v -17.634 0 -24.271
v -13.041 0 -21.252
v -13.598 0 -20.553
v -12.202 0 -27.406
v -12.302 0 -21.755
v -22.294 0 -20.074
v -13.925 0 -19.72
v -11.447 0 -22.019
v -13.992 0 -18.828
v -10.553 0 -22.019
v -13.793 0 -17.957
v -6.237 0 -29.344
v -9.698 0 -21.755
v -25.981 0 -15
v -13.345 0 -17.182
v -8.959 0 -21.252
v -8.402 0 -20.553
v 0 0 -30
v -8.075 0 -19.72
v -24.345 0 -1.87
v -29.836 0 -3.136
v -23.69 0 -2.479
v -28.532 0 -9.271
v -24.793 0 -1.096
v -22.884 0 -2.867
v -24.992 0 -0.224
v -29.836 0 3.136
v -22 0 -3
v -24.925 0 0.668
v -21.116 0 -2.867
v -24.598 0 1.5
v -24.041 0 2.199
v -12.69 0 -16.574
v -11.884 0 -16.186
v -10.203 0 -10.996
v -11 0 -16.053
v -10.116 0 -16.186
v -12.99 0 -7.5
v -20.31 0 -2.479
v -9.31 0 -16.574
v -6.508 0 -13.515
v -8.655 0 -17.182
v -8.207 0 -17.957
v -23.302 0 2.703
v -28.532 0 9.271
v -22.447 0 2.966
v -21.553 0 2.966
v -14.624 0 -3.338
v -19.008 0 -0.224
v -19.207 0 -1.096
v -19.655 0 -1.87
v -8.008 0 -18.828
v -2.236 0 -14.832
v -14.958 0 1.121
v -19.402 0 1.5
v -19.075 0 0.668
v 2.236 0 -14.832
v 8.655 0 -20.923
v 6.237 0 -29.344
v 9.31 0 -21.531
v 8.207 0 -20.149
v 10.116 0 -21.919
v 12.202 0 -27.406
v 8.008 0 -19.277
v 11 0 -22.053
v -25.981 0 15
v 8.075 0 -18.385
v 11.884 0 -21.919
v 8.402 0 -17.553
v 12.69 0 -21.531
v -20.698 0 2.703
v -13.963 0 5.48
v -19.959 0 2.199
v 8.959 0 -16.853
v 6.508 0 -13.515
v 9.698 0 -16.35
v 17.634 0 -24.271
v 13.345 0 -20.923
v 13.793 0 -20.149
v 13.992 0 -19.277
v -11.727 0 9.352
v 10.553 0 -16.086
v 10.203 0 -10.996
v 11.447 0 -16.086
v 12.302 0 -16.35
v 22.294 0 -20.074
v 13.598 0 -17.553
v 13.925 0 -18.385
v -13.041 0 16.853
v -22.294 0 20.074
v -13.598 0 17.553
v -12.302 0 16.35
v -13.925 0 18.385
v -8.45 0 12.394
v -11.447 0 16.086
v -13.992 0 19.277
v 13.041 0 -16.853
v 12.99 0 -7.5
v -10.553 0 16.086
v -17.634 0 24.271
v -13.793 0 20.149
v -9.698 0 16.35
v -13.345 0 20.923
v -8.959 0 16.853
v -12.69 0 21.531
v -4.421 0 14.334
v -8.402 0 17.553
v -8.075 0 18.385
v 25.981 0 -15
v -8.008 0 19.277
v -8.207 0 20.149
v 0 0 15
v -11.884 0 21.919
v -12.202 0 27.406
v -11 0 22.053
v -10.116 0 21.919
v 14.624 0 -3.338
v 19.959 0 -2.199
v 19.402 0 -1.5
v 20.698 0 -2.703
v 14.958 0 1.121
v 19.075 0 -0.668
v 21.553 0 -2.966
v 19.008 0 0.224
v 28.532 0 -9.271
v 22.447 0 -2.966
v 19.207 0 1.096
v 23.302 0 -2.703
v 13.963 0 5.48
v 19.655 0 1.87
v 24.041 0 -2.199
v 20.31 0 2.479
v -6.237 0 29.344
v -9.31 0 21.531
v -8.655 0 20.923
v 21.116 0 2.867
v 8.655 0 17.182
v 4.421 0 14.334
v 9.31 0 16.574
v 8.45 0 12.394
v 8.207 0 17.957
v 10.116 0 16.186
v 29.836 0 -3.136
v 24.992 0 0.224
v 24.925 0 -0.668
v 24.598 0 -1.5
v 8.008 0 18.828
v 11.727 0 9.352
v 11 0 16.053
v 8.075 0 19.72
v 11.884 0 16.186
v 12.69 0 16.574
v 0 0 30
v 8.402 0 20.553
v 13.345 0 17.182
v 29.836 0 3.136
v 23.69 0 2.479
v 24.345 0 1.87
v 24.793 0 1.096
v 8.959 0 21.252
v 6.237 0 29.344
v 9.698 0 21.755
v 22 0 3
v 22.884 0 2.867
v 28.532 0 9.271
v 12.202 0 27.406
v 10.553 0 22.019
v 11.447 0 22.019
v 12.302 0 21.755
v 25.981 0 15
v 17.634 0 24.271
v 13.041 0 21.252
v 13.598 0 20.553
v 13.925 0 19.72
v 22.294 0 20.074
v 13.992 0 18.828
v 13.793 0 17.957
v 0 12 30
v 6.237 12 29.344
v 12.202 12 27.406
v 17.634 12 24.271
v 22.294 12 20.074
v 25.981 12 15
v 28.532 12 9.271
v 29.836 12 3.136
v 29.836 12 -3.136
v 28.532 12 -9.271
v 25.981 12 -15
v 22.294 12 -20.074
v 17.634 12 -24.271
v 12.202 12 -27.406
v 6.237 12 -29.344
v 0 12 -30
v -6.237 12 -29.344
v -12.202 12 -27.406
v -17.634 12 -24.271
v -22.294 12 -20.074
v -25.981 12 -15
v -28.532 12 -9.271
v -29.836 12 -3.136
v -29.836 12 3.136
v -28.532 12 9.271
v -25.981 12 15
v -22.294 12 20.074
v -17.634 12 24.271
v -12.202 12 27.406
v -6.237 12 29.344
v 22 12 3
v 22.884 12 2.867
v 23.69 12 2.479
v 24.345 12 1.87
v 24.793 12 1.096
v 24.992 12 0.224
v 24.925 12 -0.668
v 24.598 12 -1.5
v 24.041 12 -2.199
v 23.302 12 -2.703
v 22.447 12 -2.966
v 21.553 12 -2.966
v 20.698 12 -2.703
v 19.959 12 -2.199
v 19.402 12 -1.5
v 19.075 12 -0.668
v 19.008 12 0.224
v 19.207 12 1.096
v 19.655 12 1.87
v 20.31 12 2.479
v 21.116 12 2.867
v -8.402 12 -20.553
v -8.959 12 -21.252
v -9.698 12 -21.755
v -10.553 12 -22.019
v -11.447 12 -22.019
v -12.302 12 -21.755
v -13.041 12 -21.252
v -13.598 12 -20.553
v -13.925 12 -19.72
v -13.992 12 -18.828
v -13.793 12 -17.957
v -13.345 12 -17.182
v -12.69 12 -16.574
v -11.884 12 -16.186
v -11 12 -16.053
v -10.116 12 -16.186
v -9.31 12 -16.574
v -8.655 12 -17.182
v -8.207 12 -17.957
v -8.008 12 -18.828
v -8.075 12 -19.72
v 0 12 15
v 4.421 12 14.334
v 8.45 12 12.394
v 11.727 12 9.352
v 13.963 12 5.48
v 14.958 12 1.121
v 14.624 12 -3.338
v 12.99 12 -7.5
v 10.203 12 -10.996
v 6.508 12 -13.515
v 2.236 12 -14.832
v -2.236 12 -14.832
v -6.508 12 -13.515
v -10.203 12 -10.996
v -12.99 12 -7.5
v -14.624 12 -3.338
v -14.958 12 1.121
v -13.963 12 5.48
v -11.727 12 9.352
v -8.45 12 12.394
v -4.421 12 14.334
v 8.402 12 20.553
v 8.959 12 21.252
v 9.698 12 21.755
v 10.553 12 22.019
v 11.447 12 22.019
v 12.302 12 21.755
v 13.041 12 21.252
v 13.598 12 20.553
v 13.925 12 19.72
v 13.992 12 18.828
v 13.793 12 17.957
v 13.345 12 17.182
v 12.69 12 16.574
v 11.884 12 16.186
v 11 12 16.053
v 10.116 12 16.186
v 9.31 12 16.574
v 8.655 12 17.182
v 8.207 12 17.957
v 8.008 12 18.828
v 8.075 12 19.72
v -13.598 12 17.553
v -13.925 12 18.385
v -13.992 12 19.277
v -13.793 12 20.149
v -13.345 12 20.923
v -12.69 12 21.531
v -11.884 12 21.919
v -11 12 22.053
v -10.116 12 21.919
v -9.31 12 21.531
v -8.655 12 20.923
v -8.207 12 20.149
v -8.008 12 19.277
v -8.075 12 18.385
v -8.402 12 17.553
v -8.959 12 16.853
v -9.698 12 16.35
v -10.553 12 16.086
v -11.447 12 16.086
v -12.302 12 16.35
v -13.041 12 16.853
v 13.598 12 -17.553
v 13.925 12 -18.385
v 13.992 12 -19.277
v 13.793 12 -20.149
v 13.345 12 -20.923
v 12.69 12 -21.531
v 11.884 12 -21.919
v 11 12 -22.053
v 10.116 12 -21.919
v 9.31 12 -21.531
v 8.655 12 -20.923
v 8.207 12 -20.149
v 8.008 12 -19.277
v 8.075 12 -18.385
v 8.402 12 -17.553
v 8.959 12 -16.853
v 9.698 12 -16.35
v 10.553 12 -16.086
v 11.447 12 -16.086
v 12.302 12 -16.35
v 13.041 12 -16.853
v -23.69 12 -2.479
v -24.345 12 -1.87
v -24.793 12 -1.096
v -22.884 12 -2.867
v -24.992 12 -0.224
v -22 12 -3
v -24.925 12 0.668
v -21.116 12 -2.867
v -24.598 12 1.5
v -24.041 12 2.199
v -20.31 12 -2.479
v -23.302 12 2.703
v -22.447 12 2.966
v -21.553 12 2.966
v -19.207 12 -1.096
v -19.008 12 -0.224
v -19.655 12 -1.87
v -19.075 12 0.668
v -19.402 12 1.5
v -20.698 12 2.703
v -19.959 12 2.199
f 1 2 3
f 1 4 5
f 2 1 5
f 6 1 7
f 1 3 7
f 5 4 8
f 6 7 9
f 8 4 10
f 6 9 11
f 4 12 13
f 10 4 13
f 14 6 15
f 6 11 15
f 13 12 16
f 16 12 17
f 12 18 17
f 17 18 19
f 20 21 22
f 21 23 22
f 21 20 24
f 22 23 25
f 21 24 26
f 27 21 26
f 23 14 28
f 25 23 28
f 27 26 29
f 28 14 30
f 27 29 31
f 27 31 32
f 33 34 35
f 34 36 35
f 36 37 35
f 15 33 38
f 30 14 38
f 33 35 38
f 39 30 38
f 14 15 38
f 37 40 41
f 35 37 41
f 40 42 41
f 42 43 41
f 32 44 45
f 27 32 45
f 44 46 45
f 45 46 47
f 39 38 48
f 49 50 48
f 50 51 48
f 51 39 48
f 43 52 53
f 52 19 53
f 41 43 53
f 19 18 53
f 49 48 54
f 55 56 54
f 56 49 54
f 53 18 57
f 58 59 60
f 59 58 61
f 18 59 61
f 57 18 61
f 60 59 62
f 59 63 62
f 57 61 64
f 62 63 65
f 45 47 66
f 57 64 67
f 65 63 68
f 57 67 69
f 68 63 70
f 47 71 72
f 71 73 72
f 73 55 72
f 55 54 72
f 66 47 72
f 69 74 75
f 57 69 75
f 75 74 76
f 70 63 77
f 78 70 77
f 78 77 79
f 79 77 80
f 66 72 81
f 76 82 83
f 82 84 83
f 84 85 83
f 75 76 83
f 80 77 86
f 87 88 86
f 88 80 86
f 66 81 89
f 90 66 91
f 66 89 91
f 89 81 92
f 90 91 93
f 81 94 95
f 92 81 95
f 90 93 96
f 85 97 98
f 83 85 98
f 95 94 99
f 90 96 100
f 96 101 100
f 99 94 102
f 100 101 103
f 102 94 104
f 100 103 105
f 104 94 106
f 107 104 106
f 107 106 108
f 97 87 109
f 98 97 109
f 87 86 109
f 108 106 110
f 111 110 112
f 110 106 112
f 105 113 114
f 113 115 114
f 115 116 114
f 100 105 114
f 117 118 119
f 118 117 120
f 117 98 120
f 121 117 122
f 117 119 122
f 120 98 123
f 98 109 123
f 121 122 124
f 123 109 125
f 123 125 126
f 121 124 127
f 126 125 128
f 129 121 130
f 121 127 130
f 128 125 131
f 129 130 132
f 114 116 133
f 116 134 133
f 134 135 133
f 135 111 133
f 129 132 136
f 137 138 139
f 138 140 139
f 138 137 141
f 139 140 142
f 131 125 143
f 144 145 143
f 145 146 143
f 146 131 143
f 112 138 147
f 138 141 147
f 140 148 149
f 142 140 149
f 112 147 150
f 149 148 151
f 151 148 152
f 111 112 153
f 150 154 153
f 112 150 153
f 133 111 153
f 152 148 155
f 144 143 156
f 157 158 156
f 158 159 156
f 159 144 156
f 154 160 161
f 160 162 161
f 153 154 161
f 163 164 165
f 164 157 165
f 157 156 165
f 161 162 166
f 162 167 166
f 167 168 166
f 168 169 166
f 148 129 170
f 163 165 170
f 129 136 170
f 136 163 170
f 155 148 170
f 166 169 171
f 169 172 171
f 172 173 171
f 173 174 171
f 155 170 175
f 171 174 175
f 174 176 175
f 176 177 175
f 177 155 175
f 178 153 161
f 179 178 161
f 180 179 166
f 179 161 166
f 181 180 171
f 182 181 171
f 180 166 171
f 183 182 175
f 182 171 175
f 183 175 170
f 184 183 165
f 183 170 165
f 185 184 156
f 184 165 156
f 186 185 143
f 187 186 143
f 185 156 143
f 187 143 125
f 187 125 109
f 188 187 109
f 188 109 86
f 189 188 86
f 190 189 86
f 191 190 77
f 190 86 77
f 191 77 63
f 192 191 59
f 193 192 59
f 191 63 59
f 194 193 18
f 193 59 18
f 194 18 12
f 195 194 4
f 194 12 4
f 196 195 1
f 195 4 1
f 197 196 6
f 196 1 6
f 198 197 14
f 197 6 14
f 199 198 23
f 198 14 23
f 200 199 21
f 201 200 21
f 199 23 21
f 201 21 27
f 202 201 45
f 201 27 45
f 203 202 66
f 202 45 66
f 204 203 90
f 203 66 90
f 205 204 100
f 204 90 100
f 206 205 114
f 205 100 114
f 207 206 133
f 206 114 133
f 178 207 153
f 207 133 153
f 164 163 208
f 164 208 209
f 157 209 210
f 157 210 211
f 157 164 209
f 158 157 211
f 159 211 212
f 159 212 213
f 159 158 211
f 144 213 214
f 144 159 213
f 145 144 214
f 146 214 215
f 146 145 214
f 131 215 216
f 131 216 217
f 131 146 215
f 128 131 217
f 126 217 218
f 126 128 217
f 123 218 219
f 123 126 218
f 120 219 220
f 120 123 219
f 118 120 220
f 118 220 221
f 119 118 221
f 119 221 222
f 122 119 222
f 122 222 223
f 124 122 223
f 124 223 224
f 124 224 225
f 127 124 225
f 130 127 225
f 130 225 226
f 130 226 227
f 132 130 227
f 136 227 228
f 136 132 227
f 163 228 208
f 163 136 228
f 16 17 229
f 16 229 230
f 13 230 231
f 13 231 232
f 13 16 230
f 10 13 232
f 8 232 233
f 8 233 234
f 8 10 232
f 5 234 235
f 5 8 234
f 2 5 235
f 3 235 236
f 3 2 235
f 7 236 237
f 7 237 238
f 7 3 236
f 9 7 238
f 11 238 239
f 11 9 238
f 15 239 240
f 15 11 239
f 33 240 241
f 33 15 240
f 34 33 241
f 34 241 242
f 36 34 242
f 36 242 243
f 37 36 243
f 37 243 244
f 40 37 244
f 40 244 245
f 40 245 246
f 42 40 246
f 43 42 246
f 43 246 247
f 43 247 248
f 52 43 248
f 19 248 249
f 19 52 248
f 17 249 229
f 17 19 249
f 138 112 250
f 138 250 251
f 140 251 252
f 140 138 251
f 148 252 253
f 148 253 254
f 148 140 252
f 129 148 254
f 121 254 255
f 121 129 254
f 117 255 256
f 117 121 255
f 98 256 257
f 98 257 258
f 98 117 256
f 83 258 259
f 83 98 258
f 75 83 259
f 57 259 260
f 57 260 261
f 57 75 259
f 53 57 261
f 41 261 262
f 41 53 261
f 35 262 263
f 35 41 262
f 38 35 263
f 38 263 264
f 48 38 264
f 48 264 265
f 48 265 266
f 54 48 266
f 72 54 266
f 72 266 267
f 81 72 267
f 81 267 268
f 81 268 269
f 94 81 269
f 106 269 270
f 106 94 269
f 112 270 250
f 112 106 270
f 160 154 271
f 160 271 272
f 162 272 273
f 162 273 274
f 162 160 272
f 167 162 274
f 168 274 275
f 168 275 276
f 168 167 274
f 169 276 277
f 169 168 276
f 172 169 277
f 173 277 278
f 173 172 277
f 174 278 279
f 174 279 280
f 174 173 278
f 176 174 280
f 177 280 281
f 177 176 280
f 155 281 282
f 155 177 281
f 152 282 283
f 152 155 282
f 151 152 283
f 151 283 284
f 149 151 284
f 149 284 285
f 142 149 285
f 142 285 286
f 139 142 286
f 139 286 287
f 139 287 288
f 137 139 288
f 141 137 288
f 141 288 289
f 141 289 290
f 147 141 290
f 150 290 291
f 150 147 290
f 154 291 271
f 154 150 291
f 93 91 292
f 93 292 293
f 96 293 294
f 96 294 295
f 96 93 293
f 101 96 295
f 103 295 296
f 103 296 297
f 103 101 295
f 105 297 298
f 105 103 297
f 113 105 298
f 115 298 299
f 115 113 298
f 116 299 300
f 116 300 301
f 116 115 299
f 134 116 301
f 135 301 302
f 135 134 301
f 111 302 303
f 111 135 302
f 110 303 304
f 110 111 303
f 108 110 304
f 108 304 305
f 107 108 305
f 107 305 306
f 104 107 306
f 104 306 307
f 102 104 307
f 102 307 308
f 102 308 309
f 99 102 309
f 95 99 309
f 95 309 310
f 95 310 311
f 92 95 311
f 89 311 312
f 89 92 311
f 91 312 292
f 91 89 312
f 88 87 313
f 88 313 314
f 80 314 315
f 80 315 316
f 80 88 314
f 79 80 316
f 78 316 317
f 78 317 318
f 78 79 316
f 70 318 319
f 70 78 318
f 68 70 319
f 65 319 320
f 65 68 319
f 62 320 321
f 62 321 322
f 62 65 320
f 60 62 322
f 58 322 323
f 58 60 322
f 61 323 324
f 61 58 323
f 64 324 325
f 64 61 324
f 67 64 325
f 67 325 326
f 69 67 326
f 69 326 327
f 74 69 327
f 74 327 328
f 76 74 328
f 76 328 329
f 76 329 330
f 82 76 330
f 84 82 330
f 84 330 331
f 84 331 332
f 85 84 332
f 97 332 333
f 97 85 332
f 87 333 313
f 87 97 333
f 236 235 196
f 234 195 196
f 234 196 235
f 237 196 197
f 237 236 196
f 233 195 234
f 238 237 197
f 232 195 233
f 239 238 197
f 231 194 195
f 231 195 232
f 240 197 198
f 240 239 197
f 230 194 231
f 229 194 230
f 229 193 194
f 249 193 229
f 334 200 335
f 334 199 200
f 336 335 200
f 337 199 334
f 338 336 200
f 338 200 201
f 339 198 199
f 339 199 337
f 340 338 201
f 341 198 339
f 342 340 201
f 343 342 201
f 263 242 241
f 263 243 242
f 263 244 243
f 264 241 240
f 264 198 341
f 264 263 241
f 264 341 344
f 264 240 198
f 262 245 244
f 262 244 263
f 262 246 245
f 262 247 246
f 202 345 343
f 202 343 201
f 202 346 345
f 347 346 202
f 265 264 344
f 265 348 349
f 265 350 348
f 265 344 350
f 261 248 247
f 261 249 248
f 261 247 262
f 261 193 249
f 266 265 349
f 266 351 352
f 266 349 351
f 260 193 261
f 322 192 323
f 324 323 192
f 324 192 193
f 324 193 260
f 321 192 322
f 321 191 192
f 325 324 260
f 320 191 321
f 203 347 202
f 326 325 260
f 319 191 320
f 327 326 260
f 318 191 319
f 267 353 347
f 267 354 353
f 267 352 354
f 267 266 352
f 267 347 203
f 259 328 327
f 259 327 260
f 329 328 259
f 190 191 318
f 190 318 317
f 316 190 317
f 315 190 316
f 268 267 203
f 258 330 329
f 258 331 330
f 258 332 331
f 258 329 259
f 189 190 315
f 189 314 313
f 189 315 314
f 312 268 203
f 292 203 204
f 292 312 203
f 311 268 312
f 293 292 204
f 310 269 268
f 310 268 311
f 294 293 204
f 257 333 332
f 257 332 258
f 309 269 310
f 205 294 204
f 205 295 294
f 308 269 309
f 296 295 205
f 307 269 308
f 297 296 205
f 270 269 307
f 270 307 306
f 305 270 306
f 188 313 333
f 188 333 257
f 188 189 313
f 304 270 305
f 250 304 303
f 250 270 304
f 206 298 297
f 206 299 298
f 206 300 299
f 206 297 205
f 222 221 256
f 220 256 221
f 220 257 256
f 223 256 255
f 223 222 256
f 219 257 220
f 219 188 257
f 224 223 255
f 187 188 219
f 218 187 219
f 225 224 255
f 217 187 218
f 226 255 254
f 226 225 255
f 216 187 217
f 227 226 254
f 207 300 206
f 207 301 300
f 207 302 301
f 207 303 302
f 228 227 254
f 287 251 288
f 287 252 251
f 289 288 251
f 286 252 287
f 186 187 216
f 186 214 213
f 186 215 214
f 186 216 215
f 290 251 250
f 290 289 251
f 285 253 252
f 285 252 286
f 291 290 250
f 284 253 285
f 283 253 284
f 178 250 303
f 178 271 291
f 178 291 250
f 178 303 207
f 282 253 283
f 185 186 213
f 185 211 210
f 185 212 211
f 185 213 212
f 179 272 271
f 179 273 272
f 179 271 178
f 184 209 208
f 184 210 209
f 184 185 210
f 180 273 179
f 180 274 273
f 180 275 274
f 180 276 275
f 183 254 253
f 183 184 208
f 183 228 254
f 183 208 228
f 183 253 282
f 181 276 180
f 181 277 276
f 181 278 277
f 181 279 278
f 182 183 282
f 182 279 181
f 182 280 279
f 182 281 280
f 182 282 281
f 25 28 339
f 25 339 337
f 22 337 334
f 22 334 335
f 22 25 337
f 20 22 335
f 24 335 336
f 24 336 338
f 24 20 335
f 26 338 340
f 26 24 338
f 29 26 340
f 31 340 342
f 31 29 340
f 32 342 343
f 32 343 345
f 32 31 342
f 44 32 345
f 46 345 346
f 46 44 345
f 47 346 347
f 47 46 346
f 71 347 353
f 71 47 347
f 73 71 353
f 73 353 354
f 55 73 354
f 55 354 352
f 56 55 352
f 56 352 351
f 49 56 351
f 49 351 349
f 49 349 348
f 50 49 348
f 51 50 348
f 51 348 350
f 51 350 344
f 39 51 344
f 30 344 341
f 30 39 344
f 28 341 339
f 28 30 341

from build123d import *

# Parameters (mm, degrees)
SKETCH_1_R               = 30
EXTRUDE_1_DEPTH          = 12
SKETCH_2_R               = 15
CUT_EXTRUDE_1_DEPTH      = 12
SKETCH_3_R               = 3
CUT_EXTRUDE_2_DEPTH      = 12
PATTERN_CIRCULAR_1_COUNT = 6


with BuildPart() as part:
    # 草图1 → 凸台-拉伸1 (new body)
    with BuildSketch(Plane(origin=(0, 0, 0), x_dir=(1, 0, 0), z_dir=(0, 1, 0))):
        with Locations(Location((0, 0, 0), (0, 0, 270))):
            Circle(SKETCH_1_R)
    extrude(amount=EXTRUDE_1_DEPTH)

    # 草图2 → 切除-拉伸1 (cut)
    with BuildSketch(Plane(origin=(0, 0, 0), x_dir=(1, 0, 0), z_dir=(0, 1, 0))):
        with Locations(Location((0, 0, 0), (0, 0, 270))):
            Circle(SKETCH_2_R)
    extrude(amount=CUT_EXTRUDE_1_DEPTH, mode=Mode.SUBTRACT)

    # 草图3 → 切除-拉伸2 (cut)
    with BuildSketch(Plane(origin=(0, 0, 0), x_dir=(1, 0, 0), z_dir=(0, 1, 0))):
        with Locations(Location((22, 0, 0), (0, 0, 270))):
            Circle(SKETCH_3_R)
    cut_extrude_2 = extrude(amount=CUT_EXTRUDE_2_DEPTH, mode=Mode.SUBTRACT)

    # 阵列(圆周)1: 切除-拉伸2 ×6 about axis
    pattern_circular_1_axis = Axis((0, 0, 0), (0, 1, 0))
    for i in range(1, PATTERN_CIRCULAR_1_COUNT):
        add(cut_extrude_2.rotate(pattern_circular_1_axis, i * 360 / PATTERN_CIRCULAR_1_COUNT), mode=Mode.SUBTRACT)


solid = part.part
